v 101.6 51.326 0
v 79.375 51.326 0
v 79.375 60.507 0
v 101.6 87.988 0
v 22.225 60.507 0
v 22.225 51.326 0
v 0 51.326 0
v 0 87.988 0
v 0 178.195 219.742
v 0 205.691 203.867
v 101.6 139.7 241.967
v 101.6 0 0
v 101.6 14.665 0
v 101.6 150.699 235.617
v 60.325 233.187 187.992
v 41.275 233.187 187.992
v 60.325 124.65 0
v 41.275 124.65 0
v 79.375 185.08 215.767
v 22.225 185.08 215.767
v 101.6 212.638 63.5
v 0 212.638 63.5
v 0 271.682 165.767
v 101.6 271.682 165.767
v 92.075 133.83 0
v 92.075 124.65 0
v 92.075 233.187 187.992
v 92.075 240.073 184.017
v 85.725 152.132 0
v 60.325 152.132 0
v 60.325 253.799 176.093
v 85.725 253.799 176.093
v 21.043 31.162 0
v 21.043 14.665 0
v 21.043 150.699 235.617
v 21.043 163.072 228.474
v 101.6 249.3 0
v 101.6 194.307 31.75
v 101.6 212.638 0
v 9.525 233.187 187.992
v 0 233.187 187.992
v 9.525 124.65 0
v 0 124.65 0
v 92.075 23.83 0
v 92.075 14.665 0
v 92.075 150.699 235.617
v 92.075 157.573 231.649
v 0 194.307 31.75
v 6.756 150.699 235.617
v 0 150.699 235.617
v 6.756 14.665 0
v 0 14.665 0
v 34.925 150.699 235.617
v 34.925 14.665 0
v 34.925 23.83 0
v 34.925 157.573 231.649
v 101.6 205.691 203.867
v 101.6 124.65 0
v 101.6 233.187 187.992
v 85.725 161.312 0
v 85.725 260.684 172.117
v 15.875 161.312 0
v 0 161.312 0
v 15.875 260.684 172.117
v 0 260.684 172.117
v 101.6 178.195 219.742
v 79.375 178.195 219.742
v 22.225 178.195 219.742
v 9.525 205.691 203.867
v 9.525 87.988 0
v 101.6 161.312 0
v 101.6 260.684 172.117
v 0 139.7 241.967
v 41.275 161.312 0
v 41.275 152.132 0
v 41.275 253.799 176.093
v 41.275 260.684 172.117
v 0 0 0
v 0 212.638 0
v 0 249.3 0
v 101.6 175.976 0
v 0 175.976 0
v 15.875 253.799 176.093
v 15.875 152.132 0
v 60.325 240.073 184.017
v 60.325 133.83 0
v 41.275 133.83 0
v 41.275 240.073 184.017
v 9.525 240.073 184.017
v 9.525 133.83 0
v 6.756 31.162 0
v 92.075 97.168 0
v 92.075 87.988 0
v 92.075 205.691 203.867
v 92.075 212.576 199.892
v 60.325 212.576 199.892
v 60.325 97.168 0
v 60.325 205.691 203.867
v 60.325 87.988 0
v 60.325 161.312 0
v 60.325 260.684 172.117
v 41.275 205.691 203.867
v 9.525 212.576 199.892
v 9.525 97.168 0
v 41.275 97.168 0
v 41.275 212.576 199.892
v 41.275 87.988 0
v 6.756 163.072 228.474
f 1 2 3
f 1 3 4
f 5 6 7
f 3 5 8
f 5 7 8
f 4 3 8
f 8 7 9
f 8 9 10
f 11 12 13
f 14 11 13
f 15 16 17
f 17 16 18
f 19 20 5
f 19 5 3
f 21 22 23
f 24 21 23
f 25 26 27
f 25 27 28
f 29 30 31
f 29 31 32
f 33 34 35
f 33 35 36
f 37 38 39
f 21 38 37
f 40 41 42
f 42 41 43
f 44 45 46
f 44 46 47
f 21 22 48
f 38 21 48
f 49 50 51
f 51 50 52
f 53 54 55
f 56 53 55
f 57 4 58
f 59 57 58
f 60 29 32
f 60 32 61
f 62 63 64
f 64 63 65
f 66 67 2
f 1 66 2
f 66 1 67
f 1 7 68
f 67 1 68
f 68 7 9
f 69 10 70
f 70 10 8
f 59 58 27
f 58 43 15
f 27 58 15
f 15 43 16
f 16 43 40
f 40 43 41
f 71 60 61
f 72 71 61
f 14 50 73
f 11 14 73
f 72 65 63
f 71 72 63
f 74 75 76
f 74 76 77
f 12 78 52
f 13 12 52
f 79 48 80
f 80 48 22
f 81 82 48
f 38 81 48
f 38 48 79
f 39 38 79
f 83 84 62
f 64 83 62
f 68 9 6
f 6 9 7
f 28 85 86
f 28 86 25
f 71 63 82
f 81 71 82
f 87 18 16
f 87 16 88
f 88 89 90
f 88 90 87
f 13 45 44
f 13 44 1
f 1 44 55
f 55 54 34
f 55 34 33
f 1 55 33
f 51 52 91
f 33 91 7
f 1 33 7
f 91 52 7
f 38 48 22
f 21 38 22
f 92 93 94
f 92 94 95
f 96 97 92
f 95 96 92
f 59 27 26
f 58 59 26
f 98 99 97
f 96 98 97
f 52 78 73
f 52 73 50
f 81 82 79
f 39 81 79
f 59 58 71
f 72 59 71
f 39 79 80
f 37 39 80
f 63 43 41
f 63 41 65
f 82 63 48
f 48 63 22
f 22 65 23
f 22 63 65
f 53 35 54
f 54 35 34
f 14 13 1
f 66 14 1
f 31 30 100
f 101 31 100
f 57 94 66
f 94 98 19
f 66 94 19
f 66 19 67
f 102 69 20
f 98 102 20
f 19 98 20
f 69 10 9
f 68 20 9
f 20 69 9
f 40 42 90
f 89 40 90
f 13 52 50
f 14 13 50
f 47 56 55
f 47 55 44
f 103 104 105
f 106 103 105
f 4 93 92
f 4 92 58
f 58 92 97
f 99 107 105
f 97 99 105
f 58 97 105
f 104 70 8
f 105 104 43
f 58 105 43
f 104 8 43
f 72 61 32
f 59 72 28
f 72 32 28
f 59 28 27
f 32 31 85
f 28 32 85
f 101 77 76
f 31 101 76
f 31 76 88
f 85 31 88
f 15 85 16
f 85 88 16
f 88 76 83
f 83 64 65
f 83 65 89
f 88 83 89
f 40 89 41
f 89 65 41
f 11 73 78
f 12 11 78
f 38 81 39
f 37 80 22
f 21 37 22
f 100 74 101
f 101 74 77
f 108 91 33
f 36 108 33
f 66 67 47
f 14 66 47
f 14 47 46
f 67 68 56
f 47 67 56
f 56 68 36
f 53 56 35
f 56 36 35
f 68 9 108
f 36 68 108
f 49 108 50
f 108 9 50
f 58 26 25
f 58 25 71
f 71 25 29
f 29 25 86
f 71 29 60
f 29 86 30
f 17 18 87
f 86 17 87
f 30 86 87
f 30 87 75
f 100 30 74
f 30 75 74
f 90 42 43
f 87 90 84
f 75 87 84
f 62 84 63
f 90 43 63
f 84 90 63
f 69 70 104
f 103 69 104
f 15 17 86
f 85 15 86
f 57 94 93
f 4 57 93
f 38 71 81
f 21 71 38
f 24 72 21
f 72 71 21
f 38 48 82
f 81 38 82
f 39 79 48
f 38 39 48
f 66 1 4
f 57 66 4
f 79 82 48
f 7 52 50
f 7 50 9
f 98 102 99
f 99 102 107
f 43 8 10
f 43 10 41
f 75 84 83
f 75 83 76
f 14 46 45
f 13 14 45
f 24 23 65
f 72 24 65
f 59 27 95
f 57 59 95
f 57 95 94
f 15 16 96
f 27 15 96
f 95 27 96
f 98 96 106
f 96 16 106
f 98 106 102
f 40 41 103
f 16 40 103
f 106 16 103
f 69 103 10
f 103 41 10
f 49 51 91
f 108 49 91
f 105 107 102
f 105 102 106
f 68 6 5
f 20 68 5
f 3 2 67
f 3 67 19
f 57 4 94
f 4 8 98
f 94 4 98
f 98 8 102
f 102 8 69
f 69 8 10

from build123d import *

# Parameters (mm, degrees)
F1_DEPTH  = 101.6
F2_DEPTH  = 101.6
F3_DEPTH  = 101.6
F4_DEPTH  = 101.6
F5_DEPTH  = 101.6
F6_DEPTH  = 101.6
F7_DEPTH  = 101.6
F8_DEPTH  = 101.6
F9_W      = 57.15
F9_H      = 7.9375
F9_W_2    = 14.2875
F9_H_2    = 14.2875
F9_H_3    = 7.9502
F9_W_3    = 31.75
F9_W_4    = 25.4
F10_DEPTH = 279.401


with BuildPart() as f1:
    # F0 (on Right) → F1 (new body)
    with BuildSketch(Plane.YZ):
        Polygon((139.7, 241.9674978174), (0, 0), (14.6646968374, 0), (150.6985226281, 235.6174978174), align=None)
    extrude(amount=F1_DEPTH)


with BuildPart() as f2:
    # F0 (on Right) → F2 (new body)
    with BuildSketch(Plane.YZ):
        Polygon((150.6985226281, 235.6174978174), (14.6646968374, 0), (51.326438931, 0), (178.1948291982, 219.7424978174), align=None)
    extrude(amount=F2_DEPTH)


with BuildPart() as f3:
    # F0 (on Right) → F3 (new body)
    with BuildSketch(Plane.YZ):
        Polygon((178.1948291982, 219.7424978174), (51.326438931, 0), (87.9881810245, 0), (205.6911357684, 203.8674978174), align=None)
    extrude(amount=F3_DEPTH)


with BuildPart() as f4:
    # F0 (on Right) → F4 (new body)
    with BuildSketch(Plane.YZ):
        Polygon((205.6911357684, 203.8674978174), (87.9881810245, 0), (124.649923118, 0), (233.1874423385, 187.9924978174), align=None)
    extrude(amount=F4_DEPTH)


with BuildPart() as f5:
    # F0 (on Right) → F5 (new body)
    with BuildSketch(Plane.YZ):
        Polygon((233.1874423385, 187.9924978174), (124.649923118, 0), (161.3116652116, 0), (260.6837489087, 172.1174978174), align=None)
    extrude(amount=F5_DEPTH)


with BuildPart() as f6:
    # F0 (on Right) → F6 (new body)
    with BuildSketch(Plane.YZ):
        Polygon((260.6837489087, 172.1174978174), (161.3116652116, 0), (175.976362049, 0), (194.3072330958, 31.75), (212.6381041425, 63.5), (271.6822715367, 165.7674978174), align=None)
    extrude(amount=F6_DEPTH)


with BuildPart() as f7:
    # F0 (on Right) → F7 (new body)
    with BuildSketch(Plane.YZ):
        Polygon((194.3072330958, 31.75), (175.976362049, 0), (212.6381041425, 0), align=None)
    extrude(amount=F7_DEPTH)


with BuildPart() as f8:
    # F0 (on Right) → F8 (new body)
    with BuildSketch(Plane.YZ):
        Polygon((212.6381041425, 63.5), (194.3072330958, 31.75), (212.6381041425, 0), (249.2998462361, 0), align=None)
    extrude(amount=F8_DEPTH)


with BuildPart() as f10_tool:
    # F9 (on face) → F10 (new body, through all)
    with BuildSketch(Plane(origin=(0, 139.7, 241.9674978174), x_dir=(1, 0, 0), z_dir=(0, 0.5, 0.8660254038))):
        with Locations((63.5, 16.66875)):
            Rectangle(F9_W, F9_H)
        with Locations((13.8995504521, 19.84375)):
            Rectangle(F9_W_2, F9_H_2)
        with Locations((50.8, 48.4251)):
            Rectangle(F9_W, F9_H_3)
        with Locations((76.2, 111.9251)):
            Rectangle(F9_W_3, F9_H_3)
        with Locations((25.4, 111.9251)):
            Rectangle(F9_W_3, F9_H_3)
        with Locations((73.025, 135.7249)):
            Rectangle(F9_W_4, F9_H_3)
        with Locations((28.575, 135.7249)):
            Rectangle(F9_W_4, F9_H_3)
        with Locations((76.2, 80.1751)):
            Rectangle(F9_W_3, F9_H_3)
        with Locations((25.4, 80.1751)):
            Rectangle(F9_W_3, F9_H_3)
    extrude(amount=-F10_DEPTH)


with BuildPart() as f2_1:
    add(f2.part)

    # F10: cut by f10_tool
    add(f10_tool.part, mode=Mode.SUBTRACT)


with BuildPart() as f3_1:
    add(f3.part)

    # F10: cut by f10_tool
    add(f10_tool.part, mode=Mode.SUBTRACT)


with BuildPart() as f4_1:
    add(f4.part)

    # F10: cut by f10_tool
    add(f10_tool.part, mode=Mode.SUBTRACT)


with BuildPart() as f5_1:
    add(f5.part)

    # F10: cut by f10_tool
    add(f10_tool.part, mode=Mode.SUBTRACT)


solid = Compound([f1.part, f6.part, f7.part, f8.part, f2_1.part, f3_1.part, f4_1.part, f5_1.part])
